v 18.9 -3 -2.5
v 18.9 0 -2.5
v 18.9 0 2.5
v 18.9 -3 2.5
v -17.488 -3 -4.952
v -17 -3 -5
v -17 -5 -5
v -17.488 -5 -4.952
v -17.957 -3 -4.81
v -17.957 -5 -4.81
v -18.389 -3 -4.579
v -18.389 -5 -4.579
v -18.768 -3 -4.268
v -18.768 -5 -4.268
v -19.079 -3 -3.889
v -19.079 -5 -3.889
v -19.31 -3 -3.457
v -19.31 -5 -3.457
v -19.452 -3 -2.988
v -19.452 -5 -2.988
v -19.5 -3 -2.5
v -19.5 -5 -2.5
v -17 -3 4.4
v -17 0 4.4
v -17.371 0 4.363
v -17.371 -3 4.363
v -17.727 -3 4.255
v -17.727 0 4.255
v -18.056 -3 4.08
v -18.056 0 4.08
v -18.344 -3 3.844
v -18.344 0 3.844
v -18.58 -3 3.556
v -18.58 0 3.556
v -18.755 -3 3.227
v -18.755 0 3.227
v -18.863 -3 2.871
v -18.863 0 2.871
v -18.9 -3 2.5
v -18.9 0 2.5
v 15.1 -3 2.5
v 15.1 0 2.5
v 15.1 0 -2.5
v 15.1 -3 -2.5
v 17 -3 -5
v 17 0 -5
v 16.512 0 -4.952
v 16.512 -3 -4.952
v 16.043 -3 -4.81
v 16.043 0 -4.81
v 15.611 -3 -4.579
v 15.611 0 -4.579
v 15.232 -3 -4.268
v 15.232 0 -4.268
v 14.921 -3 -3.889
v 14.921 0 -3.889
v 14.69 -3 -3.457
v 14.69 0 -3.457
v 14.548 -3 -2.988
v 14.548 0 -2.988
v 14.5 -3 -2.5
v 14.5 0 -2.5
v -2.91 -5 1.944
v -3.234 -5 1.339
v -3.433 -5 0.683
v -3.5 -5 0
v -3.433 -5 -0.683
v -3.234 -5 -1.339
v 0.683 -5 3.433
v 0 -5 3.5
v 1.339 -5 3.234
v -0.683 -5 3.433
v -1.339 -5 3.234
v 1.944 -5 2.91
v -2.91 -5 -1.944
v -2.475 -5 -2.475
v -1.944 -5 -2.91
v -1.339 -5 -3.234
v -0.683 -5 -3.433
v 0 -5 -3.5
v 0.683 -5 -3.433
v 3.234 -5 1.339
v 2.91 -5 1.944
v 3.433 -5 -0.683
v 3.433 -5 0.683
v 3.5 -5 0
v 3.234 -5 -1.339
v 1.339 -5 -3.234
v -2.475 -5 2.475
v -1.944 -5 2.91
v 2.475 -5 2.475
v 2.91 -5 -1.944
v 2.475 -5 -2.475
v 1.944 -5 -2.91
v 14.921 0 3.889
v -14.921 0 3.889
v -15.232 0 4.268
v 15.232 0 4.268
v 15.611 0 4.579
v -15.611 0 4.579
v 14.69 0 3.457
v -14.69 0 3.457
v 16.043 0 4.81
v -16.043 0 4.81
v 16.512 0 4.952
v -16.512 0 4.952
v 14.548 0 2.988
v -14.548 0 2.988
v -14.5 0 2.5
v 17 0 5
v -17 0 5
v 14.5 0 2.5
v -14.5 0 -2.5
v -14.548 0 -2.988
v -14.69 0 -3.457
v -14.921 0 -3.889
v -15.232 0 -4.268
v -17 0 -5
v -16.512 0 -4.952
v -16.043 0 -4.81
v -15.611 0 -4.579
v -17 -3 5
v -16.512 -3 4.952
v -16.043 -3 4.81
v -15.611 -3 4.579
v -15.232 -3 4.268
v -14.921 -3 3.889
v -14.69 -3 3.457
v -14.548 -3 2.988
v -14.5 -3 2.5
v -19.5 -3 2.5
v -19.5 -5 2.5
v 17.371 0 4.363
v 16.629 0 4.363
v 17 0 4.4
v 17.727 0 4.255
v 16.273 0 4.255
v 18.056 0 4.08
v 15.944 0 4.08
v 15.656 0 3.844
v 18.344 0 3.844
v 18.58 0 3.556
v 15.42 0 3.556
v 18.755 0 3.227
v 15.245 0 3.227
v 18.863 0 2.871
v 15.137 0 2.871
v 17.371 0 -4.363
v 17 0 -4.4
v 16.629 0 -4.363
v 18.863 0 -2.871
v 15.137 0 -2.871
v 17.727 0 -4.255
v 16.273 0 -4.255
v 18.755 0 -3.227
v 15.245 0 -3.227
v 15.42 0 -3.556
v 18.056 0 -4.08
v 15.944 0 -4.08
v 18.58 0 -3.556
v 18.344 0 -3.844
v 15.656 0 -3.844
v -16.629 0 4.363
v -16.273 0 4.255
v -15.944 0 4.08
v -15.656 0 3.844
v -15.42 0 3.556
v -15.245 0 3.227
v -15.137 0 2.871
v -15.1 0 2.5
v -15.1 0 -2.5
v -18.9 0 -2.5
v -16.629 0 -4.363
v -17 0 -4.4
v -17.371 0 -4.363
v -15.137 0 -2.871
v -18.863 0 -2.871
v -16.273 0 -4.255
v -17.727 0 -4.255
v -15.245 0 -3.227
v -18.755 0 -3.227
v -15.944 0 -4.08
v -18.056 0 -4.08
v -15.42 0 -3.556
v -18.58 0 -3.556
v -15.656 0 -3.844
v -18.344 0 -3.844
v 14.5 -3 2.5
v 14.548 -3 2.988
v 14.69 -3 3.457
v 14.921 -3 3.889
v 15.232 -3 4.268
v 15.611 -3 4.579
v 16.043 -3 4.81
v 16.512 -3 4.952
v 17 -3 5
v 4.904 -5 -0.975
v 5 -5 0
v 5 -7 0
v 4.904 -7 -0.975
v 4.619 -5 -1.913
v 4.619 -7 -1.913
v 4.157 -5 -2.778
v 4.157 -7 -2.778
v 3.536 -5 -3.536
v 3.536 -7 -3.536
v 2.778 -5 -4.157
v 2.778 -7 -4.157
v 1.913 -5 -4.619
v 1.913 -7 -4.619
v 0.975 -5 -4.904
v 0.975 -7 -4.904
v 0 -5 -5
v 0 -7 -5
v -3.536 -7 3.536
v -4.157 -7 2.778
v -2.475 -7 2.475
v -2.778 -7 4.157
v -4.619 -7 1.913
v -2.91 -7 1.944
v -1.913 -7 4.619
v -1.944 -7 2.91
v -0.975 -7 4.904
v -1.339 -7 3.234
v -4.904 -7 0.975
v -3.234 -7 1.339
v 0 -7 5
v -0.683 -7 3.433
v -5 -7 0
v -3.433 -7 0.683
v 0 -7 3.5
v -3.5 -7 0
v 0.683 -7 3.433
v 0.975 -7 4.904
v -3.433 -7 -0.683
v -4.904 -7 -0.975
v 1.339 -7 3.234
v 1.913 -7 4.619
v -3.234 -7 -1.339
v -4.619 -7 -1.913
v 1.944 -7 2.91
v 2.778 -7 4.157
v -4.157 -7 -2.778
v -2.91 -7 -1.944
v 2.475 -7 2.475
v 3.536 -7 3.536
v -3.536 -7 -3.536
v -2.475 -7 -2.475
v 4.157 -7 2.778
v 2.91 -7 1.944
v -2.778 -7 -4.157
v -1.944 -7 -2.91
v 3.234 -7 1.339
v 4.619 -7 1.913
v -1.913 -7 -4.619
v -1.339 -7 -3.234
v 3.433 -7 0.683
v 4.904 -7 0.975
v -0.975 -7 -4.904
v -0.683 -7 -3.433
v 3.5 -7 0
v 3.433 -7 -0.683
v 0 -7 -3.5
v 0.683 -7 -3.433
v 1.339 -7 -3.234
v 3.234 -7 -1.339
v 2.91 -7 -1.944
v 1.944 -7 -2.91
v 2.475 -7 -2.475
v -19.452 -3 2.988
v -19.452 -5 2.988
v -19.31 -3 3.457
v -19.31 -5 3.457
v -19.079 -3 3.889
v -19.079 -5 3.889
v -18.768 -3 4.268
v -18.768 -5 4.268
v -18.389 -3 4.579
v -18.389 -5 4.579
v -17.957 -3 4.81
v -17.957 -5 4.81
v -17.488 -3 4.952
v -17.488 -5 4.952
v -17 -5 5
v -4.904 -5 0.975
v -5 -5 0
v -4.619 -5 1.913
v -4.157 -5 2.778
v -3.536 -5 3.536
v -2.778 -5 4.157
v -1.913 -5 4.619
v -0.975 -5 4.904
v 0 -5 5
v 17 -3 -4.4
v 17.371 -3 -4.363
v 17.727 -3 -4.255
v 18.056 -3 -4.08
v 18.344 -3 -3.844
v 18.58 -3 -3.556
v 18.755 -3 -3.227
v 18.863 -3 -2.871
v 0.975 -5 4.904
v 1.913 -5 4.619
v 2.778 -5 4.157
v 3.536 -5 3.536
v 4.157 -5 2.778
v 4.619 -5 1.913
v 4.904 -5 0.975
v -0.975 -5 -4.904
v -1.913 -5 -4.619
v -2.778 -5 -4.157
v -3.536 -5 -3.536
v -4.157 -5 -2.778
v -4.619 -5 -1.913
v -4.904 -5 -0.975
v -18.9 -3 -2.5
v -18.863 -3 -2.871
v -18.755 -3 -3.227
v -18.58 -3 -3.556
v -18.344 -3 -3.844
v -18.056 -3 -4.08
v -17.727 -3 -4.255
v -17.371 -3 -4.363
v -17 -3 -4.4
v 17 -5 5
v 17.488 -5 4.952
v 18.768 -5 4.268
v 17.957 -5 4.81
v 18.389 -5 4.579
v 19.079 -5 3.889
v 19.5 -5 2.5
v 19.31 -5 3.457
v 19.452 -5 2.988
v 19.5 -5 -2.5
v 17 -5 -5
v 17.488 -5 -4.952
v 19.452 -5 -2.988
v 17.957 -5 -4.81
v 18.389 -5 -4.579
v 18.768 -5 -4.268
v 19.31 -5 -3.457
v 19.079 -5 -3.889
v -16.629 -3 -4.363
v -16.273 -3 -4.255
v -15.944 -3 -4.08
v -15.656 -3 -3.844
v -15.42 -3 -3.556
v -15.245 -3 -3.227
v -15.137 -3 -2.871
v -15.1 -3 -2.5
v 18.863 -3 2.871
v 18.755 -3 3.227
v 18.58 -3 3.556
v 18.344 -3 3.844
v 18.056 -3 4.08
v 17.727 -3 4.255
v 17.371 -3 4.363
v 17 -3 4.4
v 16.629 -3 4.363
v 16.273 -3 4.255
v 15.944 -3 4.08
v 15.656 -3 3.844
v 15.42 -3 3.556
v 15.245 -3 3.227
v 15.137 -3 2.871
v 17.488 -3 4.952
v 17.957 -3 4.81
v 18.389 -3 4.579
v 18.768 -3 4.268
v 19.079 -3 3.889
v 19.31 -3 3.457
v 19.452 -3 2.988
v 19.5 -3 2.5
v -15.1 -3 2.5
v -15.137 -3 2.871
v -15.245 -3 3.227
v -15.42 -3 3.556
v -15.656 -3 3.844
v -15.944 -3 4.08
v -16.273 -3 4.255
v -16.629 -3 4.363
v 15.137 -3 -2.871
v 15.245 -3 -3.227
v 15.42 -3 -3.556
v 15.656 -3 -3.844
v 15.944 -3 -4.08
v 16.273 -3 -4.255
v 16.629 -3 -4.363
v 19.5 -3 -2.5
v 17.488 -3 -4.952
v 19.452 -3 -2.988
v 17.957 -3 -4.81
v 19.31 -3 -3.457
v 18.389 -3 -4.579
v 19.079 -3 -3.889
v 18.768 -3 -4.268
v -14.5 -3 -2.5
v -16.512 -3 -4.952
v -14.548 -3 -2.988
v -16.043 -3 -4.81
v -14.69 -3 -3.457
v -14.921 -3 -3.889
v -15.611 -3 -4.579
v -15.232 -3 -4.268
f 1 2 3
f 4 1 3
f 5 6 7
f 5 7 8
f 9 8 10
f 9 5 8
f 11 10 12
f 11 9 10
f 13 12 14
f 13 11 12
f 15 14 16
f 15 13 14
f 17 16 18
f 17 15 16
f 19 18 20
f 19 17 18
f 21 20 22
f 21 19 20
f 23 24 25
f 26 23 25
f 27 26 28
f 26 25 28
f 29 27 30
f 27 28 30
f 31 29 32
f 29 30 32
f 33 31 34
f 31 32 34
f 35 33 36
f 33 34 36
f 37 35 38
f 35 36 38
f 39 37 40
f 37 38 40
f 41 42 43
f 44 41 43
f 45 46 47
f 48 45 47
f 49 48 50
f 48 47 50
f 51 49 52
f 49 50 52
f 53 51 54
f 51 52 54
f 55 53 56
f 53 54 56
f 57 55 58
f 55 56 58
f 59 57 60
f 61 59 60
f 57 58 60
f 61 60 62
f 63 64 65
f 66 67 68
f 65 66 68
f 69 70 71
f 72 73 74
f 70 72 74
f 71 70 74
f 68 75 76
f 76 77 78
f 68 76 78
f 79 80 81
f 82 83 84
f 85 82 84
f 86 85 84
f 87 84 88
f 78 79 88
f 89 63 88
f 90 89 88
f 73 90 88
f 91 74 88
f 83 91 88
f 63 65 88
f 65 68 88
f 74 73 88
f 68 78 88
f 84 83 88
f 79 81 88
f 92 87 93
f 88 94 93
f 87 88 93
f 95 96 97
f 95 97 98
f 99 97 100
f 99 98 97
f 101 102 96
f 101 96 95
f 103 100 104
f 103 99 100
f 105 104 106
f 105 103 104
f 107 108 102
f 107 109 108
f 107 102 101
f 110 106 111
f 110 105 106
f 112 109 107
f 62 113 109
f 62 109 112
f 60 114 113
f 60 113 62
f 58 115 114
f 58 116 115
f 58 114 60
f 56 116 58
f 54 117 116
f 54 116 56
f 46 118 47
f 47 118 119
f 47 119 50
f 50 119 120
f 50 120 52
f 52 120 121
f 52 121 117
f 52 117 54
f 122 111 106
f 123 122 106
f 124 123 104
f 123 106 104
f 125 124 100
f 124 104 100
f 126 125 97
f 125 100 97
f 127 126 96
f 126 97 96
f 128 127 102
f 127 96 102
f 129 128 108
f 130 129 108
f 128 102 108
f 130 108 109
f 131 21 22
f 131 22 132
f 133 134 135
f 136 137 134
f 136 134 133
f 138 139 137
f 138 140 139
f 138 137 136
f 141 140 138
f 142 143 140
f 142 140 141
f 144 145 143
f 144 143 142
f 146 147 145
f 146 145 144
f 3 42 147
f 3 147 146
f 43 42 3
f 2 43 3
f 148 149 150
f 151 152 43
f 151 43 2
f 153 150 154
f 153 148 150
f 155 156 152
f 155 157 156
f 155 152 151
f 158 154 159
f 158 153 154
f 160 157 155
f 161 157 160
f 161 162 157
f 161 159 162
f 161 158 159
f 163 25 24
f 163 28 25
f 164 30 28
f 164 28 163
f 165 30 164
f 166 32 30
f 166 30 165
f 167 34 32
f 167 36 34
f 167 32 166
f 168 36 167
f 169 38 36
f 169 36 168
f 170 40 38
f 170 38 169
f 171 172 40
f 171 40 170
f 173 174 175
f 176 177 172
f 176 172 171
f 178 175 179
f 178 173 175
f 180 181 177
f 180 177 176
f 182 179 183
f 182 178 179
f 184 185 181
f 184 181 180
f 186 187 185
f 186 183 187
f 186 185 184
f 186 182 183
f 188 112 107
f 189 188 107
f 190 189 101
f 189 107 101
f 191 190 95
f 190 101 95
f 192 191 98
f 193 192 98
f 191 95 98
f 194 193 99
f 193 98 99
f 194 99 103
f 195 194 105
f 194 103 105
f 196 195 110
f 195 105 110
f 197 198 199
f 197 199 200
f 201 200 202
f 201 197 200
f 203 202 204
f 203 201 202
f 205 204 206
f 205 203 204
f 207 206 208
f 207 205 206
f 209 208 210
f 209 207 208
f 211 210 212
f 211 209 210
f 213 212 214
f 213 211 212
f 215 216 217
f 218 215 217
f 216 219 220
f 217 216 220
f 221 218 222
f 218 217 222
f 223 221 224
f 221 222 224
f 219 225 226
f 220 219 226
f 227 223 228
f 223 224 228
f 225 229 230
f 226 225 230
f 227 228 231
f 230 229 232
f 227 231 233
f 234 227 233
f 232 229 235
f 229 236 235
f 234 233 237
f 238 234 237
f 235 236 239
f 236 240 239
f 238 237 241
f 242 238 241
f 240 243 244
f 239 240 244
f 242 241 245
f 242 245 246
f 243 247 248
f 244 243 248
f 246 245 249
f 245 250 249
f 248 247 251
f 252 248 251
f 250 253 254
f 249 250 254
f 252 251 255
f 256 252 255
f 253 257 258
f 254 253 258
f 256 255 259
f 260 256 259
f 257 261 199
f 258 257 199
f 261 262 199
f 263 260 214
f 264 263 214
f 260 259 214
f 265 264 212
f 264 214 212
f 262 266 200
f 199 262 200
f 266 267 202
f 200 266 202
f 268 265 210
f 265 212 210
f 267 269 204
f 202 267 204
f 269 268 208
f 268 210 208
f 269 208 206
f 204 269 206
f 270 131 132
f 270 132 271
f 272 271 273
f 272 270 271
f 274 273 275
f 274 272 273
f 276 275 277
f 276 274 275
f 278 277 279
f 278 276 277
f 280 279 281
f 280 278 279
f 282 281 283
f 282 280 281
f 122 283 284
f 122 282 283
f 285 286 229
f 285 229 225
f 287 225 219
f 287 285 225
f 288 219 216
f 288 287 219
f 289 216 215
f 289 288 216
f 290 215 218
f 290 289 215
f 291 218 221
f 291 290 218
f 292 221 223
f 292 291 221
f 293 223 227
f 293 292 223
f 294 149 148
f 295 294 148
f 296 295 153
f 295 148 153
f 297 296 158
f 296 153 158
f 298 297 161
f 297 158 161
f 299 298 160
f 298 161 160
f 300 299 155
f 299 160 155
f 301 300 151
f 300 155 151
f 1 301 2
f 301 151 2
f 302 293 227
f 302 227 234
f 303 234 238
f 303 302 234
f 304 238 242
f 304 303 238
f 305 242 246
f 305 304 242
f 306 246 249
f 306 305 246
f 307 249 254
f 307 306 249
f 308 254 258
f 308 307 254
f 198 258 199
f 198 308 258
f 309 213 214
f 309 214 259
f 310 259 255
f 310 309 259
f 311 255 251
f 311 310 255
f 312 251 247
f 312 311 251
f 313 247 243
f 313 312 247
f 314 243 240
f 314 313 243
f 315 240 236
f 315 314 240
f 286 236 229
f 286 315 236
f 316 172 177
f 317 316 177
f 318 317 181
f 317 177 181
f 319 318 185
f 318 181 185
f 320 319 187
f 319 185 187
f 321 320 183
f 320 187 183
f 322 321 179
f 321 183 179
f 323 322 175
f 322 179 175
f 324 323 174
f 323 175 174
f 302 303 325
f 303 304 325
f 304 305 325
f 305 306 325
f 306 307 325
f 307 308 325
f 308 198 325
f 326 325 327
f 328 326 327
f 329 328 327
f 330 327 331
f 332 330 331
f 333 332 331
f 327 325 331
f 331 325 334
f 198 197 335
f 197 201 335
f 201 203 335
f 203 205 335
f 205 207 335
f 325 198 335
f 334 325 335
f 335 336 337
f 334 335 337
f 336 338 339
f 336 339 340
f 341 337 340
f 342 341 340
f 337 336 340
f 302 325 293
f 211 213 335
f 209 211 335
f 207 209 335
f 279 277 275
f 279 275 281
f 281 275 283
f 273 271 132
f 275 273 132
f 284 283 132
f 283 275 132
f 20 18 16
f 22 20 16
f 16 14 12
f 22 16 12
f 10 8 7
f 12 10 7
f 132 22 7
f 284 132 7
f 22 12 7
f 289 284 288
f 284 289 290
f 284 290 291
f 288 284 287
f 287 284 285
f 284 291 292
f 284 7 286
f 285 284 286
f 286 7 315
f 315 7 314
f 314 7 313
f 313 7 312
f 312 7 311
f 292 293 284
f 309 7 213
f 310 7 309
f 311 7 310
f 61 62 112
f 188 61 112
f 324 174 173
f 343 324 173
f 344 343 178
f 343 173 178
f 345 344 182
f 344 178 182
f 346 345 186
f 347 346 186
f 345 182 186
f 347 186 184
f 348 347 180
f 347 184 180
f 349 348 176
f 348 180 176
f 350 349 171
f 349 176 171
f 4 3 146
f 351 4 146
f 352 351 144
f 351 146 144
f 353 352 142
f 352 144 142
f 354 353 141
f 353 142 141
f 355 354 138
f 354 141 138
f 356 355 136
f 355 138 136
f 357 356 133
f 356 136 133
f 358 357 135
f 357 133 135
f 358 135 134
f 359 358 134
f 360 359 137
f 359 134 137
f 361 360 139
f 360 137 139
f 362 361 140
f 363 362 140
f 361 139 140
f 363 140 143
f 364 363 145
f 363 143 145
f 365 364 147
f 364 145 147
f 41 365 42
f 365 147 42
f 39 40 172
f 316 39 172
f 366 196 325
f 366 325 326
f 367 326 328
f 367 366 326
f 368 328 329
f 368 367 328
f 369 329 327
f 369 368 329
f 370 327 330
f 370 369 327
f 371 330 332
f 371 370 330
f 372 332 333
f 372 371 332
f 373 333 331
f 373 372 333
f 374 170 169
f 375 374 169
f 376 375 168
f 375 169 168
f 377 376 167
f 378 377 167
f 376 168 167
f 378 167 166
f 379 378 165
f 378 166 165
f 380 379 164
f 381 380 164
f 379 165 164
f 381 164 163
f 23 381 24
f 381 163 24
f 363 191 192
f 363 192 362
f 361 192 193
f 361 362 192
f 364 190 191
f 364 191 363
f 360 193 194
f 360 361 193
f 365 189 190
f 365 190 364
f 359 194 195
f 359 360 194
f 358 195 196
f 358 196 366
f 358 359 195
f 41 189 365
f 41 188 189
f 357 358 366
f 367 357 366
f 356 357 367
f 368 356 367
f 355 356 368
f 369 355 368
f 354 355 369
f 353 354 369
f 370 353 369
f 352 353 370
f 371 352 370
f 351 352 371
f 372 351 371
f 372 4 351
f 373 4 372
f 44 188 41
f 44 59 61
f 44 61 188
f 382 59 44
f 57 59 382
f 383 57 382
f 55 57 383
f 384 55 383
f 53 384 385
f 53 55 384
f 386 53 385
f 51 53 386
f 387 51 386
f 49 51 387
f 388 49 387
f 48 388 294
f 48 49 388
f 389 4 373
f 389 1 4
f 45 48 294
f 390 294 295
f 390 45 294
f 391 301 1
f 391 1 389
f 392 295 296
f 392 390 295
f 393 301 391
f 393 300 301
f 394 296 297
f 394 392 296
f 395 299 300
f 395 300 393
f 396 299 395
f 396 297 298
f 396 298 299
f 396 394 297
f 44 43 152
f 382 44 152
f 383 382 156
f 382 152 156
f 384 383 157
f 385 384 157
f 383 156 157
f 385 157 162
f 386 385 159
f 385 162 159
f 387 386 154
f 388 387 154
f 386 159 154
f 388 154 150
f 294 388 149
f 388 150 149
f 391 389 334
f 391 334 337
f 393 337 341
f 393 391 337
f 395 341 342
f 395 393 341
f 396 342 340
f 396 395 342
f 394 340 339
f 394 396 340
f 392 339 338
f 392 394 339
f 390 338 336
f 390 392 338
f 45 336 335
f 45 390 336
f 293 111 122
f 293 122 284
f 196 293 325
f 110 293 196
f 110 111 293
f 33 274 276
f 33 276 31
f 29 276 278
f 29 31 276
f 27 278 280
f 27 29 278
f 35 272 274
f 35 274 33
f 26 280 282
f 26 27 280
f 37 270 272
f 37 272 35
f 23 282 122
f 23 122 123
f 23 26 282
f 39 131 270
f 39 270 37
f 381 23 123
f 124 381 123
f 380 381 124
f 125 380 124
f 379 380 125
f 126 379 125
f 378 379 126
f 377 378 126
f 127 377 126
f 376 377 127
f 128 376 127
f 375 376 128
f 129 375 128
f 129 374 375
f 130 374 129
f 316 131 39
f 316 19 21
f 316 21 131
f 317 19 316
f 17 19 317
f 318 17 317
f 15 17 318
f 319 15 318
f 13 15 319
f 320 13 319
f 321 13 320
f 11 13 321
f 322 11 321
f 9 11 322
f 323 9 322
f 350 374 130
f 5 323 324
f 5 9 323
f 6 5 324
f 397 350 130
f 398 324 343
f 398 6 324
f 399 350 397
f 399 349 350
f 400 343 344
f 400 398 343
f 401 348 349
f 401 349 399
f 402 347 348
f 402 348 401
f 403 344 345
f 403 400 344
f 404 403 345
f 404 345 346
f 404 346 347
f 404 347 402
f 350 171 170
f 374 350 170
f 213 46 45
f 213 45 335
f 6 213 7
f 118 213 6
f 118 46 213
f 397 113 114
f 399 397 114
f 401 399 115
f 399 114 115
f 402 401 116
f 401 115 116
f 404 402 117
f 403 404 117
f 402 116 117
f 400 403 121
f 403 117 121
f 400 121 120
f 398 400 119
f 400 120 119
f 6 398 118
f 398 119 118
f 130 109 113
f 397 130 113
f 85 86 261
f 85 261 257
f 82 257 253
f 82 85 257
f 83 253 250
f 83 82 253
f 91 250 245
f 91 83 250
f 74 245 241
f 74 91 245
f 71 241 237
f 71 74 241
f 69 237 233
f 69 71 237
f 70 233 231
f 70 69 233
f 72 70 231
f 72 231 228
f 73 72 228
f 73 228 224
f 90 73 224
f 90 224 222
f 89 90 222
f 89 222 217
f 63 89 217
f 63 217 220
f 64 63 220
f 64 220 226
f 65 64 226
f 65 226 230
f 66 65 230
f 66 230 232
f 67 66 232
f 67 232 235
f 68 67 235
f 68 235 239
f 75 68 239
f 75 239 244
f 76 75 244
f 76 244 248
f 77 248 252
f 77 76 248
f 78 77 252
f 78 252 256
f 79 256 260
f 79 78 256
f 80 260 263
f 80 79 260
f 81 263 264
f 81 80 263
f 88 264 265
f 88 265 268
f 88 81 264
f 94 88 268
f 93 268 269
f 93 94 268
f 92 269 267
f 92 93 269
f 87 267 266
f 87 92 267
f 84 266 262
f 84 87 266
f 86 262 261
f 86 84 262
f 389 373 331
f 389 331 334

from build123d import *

# Parameters (mm, degrees)
BOSS_EXTRU_2_DEPTH      = 5
ESQUISSE1_9_R           = 5
ESQUISSE1_9_R_2         = 3.5
BOSS_EXTRU_7_DEPTH      = 7
ENL_V_MAT_EXTRU_3_DEPTH = 3
ENL_V_MAT_EXTRU_4_DEPTH = 3


with BuildPart() as part:
    # Esquisse1 → Boss.-Extru.2 (new body)
    with BuildSketch(Plane(origin=(0, 0, 0), x_dir=(1, 0, 0), z_dir=(0, 1, 0))):
        with BuildLine():
            ThreePointArc((17, -5), (18.767766953, -4.267766953), (19.5, -2.5))
            Line((19.5, -2.5), (19.5, 2.5))
            ThreePointArc((19.5, 2.5), (18.767766953, 4.267766953), (17, 5))
            Line((17, 5), (-17, 5))
            ThreePointArc((-17, 5), (-18.767766953, 4.267766953), (-19.5, 2.5))
            Line((-19.5, 2.5), (-19.5, -2.5))
            ThreePointArc((-19.5, -2.5), (-18.767766953, -4.267766953), (-17, -5))
            Line((-17, -5), (17, -5))
        make_face()
    extrude(amount=-BOSS_EXTRU_2_DEPTH)

    # Esquisse1_9 → Boss.-Extru.7 (add)
    with BuildSketch(Plane(origin=(0, 0, 0), x_dir=(1, 0, 0), z_dir=(0, 1, 0))):
        Circle(ESQUISSE1_9_R)
        Circle(ESQUISSE1_9_R_2, mode=Mode.SUBTRACT)
    extrude(amount=-BOSS_EXTRU_7_DEPTH)

    # Esquisse1_13 → Enl_v. mat.-Extru.3 (cut)
    with BuildSketch(Plane(origin=(0, 0, 0), x_dir=(1, 0, 0), z_dir=(0, 1, 0))):
        with BuildLine():
            ThreePointArc((14.5, -2.5), (17, -5), (19.5, -2.5))
            Line((19.5, -2.5), (19.5, 2.5))
            ThreePointArc((19.5, 2.5), (17, 5), (14.5, 2.5))
            Line((14.5, 2.5), (14.5, -2.5))
        make_face()
        with BuildLine():
            Line((15.1, -2.5), (15.1, 2.5))
            ThreePointArc((15.1, 2.5), (17, 4.4), (18.9, 2.5))
            Line((18.9, 2.5), (18.9, -2.5))
            ThreePointArc((18.9, -2.5), (17, -4.4), (15.1, -2.5))
        make_face(mode=Mode.SUBTRACT)
    extrude(amount=-ENL_V_MAT_EXTRU_3_DEPTH, mode=Mode.SUBTRACT)

    # Esquisse1_16 → Enl_v. mat.-Extru.4 (cut)
    with BuildSketch(Plane(origin=(0, 0, 0), x_dir=(1, 0, 0), z_dir=(0, 1, 0))):
        with BuildLine():
            ThreePointArc((-19.5, -2.5), (-17, -5), (-14.5, -2.5))
            Line((-14.5, -2.5), (-14.5, 2.5))
            ThreePointArc((-14.5, 2.5), (-17, 5), (-19.5, 2.5))
            Line((-19.5, 2.5), (-19.5, -2.5))
        make_face()
        with BuildLine():
            Line((-18.9, -2.5), (-18.9, 2.5))
            ThreePointArc((-18.9, 2.5), (-17, 4.4), (-15.1, 2.5))
            Line((-15.1, 2.5), (-15.1, -2.5))
            ThreePointArc((-15.1, -2.5), (-17, -4.4), (-18.9, -2.5))
        make_face(mode=Mode.SUBTRACT)
    extrude(amount=-ENL_V_MAT_EXTRU_4_DEPTH, mode=Mode.SUBTRACT)


solid = part.part
